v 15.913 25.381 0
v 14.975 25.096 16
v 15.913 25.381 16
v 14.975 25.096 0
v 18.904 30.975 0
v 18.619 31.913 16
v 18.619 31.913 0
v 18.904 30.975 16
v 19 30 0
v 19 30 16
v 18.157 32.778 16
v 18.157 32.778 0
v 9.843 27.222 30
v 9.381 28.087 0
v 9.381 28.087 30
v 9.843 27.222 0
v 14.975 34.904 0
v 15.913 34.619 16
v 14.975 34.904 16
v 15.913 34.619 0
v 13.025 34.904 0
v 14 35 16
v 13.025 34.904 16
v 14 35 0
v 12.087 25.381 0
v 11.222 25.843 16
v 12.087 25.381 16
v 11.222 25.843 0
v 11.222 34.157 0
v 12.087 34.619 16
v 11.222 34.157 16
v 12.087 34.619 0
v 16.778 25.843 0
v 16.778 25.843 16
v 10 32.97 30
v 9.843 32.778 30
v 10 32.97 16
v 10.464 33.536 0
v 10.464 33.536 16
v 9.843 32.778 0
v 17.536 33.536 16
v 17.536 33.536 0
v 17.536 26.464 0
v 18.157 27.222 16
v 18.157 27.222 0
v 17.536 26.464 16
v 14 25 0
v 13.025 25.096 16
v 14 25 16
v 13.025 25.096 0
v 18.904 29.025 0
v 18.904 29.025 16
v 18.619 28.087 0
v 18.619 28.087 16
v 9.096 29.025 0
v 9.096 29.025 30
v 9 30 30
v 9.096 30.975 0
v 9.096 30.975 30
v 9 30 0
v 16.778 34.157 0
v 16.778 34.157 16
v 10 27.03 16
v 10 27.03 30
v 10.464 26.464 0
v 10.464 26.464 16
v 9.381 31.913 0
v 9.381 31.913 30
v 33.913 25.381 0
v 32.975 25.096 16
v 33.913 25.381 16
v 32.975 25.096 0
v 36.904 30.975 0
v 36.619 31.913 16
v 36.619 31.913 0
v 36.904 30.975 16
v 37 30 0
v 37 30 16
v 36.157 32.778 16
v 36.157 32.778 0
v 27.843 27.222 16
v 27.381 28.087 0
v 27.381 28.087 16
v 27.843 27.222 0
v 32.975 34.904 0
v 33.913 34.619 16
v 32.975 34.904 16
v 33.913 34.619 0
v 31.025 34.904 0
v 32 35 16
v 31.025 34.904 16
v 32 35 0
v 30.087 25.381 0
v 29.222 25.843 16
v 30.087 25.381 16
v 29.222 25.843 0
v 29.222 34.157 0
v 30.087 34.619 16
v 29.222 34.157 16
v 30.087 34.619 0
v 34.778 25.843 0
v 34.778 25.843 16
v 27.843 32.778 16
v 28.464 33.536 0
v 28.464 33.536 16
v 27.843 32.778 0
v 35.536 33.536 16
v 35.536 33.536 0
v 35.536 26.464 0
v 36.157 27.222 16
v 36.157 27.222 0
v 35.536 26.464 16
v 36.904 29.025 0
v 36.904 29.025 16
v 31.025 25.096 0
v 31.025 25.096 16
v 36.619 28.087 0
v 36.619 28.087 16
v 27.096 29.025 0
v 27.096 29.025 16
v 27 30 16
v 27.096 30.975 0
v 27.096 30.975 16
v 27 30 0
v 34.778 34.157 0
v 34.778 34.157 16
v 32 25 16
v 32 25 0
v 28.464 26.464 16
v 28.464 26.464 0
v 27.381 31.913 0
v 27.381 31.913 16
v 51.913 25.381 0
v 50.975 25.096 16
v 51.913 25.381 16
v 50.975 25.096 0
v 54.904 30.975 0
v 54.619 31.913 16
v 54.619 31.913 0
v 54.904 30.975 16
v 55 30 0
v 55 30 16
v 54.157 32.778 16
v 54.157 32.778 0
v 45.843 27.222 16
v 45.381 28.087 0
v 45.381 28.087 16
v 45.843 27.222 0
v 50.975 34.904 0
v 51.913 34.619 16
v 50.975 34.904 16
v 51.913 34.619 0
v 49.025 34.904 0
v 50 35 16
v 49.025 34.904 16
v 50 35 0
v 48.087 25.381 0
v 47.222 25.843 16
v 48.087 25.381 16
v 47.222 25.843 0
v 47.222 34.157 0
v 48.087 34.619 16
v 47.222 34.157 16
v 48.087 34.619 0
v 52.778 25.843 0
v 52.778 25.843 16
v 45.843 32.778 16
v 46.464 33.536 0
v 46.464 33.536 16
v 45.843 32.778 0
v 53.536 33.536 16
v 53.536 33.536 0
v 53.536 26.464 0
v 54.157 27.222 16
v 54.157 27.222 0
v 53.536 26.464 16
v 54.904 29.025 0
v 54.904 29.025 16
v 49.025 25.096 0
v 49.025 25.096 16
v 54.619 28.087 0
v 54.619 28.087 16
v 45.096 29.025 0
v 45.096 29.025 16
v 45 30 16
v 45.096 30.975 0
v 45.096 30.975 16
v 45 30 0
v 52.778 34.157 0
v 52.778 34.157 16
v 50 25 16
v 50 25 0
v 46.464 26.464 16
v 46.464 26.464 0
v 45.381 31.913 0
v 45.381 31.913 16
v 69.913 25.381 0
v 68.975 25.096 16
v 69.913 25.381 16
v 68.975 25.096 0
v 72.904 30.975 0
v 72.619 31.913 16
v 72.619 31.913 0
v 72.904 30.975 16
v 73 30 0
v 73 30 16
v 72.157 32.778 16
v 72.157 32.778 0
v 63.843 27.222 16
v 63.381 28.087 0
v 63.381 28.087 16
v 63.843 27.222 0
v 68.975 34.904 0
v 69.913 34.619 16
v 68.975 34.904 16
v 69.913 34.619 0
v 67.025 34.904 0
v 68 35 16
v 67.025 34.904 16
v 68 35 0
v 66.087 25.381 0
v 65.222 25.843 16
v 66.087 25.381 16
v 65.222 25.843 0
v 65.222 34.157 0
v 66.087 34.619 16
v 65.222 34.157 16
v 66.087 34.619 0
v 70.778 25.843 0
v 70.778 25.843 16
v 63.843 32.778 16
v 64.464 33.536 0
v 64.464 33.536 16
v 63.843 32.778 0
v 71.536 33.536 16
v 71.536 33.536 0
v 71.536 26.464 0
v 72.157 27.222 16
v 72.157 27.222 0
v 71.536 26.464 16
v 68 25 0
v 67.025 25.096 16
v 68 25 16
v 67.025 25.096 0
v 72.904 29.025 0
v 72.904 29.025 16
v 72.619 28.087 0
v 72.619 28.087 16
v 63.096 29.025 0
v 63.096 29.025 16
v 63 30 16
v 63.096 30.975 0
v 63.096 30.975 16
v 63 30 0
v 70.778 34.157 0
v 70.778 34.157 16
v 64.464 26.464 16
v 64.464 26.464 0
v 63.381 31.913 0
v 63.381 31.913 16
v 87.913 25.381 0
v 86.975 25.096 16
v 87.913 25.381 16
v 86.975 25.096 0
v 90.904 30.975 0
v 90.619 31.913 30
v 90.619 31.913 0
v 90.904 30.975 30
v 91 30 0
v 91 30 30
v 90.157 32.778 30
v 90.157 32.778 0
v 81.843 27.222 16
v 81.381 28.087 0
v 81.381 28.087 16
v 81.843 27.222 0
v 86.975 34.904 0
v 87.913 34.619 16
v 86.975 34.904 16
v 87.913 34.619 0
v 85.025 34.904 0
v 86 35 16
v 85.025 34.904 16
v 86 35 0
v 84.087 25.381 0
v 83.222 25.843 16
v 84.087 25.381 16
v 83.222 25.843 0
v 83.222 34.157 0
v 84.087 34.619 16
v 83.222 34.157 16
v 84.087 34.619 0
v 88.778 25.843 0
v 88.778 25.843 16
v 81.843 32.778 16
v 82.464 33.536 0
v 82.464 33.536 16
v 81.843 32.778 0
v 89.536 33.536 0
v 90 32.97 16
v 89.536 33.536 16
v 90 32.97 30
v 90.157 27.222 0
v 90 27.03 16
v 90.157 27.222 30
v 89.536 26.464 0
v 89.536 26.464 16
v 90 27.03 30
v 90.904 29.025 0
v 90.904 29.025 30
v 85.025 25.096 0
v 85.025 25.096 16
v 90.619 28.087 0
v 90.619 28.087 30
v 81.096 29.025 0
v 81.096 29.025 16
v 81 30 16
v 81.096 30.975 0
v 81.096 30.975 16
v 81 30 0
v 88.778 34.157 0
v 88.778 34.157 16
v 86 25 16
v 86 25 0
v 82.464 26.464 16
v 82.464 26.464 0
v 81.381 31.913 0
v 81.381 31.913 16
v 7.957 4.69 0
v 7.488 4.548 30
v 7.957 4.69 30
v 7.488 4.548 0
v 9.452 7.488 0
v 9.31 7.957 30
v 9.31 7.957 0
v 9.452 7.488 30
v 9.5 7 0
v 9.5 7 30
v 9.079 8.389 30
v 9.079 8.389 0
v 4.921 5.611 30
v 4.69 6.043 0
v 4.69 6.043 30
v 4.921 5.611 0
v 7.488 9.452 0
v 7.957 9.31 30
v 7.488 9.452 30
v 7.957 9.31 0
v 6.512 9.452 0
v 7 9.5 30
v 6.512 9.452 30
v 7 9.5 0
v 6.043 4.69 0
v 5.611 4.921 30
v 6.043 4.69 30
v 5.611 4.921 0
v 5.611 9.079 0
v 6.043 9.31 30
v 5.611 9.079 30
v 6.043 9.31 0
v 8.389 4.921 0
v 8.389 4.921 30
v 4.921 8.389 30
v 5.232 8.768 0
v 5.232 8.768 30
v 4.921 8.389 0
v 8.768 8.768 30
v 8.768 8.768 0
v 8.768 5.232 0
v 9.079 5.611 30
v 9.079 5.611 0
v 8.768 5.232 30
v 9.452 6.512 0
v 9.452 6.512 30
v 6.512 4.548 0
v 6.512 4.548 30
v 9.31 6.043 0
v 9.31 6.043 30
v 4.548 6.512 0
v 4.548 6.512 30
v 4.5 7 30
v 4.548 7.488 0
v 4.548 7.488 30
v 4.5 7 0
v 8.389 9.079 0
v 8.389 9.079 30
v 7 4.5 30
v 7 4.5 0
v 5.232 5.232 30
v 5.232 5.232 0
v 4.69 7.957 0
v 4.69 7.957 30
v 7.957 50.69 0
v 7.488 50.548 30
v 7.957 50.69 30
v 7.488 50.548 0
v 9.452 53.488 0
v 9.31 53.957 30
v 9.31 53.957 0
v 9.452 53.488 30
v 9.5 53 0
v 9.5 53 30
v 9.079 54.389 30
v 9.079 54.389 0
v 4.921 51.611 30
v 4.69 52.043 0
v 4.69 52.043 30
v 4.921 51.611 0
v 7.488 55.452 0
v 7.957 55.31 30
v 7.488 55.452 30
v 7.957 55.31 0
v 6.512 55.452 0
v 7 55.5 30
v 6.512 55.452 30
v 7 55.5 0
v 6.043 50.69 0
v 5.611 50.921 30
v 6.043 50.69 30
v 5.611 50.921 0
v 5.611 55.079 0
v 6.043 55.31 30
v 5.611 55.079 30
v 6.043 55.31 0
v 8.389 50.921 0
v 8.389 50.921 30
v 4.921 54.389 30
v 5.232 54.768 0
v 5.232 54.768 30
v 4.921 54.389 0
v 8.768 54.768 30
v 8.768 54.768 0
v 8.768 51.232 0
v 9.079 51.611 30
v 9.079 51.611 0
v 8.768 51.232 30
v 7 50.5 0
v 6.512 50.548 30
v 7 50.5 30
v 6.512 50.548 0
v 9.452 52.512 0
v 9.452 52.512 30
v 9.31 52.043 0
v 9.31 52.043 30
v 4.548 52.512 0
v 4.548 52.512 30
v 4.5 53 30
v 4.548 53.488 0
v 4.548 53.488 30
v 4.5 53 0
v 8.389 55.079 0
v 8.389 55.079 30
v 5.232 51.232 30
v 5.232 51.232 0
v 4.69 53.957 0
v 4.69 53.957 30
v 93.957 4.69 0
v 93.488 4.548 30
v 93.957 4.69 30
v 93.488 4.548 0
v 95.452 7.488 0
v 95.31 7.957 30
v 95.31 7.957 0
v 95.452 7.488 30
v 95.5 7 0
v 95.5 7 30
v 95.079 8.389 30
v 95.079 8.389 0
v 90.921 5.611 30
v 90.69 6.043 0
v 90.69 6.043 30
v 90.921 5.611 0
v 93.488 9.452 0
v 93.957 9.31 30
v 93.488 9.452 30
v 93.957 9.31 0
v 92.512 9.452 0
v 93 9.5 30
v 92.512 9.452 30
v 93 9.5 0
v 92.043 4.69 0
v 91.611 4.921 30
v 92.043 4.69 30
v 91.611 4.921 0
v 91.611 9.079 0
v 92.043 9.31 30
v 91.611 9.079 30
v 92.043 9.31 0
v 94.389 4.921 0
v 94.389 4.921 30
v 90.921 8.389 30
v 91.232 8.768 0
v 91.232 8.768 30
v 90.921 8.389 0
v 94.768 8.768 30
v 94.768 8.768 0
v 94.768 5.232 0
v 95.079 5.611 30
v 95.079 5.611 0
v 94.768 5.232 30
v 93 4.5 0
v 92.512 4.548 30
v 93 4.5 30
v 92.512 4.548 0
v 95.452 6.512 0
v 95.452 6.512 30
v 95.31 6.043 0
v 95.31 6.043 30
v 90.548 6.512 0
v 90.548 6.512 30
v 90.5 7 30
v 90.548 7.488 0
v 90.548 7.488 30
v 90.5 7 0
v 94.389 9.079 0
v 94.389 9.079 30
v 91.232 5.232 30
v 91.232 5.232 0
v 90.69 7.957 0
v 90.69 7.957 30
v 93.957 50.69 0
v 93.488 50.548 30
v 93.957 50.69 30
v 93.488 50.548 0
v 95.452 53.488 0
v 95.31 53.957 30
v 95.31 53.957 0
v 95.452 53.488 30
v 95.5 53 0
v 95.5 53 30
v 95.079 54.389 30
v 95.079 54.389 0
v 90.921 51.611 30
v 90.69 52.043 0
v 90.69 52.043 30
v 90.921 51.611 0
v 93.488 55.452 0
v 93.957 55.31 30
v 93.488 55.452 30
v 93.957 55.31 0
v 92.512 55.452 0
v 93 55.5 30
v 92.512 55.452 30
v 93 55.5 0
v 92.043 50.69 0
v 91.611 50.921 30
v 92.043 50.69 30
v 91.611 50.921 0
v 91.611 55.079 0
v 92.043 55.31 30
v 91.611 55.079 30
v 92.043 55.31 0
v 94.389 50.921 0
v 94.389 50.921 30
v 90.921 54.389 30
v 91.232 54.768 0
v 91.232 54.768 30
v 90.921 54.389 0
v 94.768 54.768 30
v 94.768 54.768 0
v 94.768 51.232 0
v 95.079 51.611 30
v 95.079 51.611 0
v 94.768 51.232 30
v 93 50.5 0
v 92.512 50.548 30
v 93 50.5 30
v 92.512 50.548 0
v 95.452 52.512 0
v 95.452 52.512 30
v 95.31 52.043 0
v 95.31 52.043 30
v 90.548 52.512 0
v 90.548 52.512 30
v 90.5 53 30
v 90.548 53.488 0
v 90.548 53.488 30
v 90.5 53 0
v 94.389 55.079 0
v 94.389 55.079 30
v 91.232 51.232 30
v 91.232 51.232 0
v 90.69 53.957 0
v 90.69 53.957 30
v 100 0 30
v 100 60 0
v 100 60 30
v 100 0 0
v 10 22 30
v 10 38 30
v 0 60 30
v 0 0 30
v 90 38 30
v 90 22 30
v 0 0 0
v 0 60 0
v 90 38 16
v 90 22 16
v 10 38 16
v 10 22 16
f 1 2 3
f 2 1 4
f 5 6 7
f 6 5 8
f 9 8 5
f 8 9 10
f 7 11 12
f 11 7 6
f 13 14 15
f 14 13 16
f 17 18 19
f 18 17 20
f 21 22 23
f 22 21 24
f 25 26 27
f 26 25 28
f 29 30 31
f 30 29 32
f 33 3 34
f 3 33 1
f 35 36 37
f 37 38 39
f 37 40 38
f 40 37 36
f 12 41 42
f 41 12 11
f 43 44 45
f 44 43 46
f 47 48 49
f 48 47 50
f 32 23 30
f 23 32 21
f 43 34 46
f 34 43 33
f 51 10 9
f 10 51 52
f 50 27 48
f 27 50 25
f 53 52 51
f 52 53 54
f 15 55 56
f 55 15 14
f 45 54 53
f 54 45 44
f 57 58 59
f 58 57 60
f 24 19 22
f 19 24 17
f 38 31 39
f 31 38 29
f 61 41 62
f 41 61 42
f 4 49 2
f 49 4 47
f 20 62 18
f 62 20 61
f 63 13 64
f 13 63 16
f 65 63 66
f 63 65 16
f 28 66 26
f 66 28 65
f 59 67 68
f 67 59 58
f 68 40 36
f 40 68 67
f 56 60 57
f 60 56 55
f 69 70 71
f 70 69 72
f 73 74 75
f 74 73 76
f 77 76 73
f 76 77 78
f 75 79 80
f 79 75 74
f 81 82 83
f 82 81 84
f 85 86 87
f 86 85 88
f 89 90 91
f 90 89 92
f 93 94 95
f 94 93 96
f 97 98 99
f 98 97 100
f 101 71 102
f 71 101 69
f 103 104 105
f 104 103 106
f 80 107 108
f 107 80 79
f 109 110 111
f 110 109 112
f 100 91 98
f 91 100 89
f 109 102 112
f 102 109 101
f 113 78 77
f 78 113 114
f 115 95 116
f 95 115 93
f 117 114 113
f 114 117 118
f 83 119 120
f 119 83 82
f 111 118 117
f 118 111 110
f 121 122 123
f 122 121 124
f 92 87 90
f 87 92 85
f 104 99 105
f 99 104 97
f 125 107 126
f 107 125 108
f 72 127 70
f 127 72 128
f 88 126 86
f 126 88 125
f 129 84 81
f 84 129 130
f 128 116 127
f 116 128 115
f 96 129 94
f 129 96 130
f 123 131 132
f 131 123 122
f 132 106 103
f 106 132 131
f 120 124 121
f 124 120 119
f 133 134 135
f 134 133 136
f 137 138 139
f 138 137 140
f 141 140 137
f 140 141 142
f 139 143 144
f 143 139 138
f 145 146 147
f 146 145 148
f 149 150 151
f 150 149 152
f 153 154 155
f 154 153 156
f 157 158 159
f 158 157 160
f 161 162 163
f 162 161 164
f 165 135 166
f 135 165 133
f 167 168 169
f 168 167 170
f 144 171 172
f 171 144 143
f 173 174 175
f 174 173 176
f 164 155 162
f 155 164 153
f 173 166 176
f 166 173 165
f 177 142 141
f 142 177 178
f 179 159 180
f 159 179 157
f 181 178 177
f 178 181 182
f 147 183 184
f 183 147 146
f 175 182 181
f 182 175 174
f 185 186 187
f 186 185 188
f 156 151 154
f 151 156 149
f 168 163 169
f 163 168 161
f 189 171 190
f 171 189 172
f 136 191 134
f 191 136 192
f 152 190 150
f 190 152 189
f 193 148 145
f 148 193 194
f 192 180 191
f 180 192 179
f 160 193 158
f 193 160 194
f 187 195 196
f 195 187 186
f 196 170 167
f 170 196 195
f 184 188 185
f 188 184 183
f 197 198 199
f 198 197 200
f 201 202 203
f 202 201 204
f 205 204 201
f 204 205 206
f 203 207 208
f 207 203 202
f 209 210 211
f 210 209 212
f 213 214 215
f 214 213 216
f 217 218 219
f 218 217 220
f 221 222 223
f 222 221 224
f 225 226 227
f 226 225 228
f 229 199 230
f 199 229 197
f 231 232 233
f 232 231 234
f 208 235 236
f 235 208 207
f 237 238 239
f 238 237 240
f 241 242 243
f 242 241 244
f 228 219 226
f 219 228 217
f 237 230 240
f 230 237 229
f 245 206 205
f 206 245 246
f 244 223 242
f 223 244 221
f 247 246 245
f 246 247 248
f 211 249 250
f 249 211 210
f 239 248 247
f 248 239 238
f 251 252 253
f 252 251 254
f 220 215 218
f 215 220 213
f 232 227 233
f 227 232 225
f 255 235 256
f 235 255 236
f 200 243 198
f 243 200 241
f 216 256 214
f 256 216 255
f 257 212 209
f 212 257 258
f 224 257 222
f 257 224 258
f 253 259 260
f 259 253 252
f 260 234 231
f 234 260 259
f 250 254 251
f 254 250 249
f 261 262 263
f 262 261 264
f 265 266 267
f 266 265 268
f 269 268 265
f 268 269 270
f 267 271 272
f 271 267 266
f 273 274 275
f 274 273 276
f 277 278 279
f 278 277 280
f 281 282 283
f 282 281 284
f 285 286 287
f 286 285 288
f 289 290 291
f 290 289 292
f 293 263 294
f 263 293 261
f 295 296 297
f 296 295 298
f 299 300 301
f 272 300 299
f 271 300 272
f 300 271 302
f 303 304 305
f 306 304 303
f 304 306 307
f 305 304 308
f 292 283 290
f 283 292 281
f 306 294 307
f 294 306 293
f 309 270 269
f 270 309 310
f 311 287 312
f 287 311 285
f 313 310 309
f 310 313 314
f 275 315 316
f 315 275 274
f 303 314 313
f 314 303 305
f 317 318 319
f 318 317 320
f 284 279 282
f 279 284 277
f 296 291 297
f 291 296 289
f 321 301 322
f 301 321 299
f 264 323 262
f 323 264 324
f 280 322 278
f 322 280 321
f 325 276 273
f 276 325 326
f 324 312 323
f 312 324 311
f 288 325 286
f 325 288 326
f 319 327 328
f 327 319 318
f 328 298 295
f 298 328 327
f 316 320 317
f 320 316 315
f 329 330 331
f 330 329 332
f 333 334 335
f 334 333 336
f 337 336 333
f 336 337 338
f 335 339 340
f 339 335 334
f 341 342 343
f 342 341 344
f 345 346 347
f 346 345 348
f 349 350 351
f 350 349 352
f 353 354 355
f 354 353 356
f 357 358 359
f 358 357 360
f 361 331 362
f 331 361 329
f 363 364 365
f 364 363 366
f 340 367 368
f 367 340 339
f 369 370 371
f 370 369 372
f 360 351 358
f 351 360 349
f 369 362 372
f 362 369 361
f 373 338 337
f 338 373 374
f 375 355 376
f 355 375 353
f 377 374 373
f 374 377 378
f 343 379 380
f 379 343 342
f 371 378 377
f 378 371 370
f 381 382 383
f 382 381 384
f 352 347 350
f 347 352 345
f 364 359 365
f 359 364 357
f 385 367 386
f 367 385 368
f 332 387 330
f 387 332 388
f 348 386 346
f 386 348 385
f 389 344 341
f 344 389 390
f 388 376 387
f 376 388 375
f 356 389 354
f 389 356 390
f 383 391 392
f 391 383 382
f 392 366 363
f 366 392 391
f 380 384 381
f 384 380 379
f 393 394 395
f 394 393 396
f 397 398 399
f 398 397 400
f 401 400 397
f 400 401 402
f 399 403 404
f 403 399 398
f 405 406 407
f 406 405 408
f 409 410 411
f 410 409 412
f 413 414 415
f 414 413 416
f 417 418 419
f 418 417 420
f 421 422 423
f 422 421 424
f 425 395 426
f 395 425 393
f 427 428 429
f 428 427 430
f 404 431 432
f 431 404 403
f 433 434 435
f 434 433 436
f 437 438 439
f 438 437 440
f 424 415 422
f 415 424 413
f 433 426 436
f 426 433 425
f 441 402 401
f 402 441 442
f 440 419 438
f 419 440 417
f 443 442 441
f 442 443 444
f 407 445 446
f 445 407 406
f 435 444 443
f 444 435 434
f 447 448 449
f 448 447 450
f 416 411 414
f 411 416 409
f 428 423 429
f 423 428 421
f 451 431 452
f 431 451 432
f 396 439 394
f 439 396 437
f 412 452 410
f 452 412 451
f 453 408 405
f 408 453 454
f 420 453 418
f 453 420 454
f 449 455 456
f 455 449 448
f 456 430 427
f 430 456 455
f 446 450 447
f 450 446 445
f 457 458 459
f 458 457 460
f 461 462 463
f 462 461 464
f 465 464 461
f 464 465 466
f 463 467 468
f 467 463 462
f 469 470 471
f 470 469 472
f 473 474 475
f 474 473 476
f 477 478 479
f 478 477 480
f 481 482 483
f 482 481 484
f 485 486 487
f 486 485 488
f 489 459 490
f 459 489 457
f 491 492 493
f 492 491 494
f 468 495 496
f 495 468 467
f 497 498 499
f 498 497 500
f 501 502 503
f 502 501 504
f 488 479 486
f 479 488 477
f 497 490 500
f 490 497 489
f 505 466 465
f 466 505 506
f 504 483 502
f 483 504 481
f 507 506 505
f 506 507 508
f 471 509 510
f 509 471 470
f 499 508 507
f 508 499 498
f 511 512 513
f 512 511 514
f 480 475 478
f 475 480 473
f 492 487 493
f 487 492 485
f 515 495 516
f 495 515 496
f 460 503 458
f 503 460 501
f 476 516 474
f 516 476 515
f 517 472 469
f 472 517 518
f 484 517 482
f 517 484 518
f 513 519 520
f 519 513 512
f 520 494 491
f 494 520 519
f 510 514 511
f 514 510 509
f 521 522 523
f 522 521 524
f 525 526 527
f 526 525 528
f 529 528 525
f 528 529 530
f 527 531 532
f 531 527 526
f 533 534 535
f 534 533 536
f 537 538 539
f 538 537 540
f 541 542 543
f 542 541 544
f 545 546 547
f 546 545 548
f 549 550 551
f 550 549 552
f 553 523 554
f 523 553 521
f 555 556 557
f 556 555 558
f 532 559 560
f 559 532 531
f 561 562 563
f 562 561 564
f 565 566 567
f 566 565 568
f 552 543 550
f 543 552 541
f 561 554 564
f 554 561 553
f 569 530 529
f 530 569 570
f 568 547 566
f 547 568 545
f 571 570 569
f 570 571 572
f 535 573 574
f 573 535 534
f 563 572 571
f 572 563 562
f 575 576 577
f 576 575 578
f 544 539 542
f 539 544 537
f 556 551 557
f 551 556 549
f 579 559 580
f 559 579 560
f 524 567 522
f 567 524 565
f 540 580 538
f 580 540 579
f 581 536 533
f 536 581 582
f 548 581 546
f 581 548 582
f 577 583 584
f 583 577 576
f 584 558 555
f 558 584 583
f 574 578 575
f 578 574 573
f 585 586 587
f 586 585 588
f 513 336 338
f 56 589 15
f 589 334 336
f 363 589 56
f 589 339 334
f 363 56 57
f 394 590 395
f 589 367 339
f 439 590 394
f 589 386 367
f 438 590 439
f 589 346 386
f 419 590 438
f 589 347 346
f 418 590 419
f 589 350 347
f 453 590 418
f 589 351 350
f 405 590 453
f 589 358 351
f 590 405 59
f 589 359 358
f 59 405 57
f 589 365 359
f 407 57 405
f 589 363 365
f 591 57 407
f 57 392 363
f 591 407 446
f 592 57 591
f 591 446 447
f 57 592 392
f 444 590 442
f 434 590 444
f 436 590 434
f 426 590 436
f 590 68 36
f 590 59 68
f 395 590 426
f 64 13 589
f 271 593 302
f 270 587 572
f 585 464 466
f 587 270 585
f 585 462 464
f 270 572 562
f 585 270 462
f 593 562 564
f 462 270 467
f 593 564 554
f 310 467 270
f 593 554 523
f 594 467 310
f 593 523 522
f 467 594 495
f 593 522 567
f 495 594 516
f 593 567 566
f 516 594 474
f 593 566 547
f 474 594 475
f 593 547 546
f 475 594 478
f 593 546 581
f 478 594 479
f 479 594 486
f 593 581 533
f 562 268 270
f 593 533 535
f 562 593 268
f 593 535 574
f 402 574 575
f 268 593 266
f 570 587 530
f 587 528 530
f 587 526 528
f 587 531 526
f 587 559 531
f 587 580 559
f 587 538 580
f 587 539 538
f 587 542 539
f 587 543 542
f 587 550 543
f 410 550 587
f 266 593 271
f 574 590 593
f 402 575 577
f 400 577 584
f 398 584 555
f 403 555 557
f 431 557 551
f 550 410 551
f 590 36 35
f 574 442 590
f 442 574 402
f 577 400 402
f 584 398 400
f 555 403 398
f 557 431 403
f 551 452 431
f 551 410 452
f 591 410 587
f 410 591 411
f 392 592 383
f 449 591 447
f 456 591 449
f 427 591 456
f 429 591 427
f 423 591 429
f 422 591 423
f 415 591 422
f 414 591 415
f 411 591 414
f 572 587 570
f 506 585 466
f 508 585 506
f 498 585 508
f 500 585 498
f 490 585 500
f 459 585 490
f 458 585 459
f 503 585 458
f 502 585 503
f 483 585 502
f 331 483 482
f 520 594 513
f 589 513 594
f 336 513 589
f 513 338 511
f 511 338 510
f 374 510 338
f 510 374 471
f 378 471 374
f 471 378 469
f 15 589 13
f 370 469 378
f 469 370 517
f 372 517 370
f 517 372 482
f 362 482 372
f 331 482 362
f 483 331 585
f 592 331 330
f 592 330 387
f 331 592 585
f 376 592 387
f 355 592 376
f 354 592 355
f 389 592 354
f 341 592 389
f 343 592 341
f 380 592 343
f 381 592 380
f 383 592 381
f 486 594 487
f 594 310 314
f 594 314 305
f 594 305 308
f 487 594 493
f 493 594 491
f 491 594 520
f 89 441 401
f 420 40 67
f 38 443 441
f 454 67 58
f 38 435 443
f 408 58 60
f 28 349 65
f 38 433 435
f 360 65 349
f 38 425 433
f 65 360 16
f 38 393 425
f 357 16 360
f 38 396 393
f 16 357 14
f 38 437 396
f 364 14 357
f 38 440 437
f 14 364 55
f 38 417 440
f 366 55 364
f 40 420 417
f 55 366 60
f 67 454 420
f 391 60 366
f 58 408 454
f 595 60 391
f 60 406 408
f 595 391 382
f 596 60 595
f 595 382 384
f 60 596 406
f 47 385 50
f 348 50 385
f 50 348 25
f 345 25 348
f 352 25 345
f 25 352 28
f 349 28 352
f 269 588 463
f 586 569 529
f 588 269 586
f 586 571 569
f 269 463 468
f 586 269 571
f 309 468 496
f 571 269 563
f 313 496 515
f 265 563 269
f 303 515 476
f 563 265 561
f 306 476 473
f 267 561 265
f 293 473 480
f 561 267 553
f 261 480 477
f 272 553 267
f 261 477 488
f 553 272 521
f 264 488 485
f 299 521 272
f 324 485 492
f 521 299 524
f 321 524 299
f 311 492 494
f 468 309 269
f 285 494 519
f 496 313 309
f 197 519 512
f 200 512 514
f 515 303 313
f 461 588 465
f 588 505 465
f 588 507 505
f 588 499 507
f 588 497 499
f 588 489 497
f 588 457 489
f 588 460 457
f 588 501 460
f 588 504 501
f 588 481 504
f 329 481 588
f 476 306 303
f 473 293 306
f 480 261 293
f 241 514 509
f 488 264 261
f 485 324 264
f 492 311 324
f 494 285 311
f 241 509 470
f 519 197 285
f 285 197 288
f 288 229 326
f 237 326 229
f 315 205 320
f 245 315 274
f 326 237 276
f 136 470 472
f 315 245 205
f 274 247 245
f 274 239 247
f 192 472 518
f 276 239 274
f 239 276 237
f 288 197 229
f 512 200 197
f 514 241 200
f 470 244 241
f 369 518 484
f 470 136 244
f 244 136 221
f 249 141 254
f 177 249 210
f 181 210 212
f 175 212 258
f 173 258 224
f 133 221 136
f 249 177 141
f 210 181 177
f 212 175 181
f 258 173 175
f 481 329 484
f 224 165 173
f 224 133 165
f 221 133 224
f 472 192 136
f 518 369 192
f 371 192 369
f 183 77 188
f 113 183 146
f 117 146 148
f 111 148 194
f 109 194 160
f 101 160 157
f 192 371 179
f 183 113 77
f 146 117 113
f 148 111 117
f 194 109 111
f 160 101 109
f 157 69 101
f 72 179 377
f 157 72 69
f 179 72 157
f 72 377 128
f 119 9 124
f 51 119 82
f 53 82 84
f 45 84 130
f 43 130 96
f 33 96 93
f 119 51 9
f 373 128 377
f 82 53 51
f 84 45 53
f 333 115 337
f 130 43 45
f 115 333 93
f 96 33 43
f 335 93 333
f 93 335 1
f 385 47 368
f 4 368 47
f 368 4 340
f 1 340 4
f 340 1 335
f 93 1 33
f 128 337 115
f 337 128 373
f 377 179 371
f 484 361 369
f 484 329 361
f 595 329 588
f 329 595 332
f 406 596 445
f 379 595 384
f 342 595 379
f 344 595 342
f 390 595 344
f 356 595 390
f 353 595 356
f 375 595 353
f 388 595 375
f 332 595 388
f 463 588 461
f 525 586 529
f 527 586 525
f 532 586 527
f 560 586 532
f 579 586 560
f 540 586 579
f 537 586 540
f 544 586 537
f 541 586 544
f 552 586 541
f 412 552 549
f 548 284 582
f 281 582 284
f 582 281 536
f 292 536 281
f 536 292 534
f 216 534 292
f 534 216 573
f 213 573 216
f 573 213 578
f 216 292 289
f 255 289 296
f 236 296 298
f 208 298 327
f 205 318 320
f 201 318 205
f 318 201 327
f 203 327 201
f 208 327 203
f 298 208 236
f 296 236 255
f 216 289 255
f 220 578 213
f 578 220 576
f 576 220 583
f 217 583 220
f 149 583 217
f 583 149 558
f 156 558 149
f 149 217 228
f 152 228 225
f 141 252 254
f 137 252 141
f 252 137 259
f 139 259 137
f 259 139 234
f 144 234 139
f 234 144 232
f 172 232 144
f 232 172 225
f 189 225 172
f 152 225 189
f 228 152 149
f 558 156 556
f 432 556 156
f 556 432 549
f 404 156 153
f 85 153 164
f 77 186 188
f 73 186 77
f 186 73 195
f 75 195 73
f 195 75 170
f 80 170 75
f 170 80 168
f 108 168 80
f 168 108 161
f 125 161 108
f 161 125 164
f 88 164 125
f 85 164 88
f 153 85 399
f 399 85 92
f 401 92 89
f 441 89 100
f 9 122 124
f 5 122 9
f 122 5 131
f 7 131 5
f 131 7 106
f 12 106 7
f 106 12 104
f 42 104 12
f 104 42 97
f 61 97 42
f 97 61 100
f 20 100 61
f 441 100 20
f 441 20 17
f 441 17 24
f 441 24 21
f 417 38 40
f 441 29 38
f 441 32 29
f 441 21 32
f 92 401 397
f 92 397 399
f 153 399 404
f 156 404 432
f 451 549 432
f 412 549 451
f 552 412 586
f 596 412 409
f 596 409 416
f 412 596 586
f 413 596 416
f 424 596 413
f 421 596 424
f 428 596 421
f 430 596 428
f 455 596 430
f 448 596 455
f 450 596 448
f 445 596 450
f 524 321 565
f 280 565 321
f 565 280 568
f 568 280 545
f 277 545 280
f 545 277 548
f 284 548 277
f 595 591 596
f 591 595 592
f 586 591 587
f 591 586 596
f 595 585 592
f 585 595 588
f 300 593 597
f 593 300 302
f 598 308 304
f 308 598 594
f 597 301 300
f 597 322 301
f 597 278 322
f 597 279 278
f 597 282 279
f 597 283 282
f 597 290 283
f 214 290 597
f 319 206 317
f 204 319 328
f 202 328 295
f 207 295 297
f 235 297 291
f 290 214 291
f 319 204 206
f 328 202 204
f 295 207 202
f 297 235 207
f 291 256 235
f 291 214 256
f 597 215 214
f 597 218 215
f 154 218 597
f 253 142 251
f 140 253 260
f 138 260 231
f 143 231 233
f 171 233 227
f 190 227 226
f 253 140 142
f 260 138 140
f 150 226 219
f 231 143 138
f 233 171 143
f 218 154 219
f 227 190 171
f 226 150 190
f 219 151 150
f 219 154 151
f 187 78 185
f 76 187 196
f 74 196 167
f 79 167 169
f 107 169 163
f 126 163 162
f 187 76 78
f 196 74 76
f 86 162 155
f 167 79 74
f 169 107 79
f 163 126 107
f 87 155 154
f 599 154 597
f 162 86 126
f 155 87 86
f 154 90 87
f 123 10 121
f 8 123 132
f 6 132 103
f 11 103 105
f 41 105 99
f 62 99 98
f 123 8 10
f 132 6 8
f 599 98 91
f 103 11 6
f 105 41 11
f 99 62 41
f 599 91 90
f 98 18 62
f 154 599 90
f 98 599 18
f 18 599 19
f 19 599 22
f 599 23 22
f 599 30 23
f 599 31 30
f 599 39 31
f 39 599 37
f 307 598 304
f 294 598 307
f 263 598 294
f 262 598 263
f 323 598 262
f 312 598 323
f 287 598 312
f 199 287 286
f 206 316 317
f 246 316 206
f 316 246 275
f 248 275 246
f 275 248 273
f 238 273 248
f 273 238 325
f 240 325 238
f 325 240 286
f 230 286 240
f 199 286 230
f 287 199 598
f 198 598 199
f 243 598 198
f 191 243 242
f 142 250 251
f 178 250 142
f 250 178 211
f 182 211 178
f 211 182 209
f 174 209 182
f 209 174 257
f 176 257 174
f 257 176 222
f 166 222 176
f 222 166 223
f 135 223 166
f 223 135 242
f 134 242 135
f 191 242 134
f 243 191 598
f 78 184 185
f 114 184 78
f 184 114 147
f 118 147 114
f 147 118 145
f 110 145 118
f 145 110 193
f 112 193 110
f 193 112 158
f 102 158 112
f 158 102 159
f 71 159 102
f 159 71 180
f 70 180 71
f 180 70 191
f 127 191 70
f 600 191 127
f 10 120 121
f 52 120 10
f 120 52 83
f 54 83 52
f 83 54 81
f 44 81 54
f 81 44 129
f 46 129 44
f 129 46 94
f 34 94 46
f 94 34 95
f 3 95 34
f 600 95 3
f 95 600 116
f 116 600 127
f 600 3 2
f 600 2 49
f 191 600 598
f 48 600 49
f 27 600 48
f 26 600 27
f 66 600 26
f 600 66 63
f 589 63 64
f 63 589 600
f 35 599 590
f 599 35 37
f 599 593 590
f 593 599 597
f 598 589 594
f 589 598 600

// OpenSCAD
$fn = 32;

// ----------------------------------------------------------------------
// Manifold block: gallery_top manifold
// ----------------------------------------------------------------------

// --- parameters (mm) ---
block_l = 100;            // block length, X
block_w = 60;             // block width, Y
block_h = 30;             // block height, Z
port_d = 10;              // port bore diameter
port_pitch = 18;          // port pitch along X
gallery_d = 16;           // top gallery width, Y
gallery_depth = 14;       // gallery pocket depth
wall_p = 10;              // gallery end wall thickness, X
mnt_d = 5;                // mounting hole diameter
mnt_in = 7;               // mounting hole inset from the edges

n_ports = 5;  // ports in the row
port_x0 = (block_l - (n_ports - 1) * port_pitch) / 2;  // first port X

difference() {
  cube([block_l, block_w, block_h]);
  for (i = [0 : n_ports - 1])
    translate([port_x0 + i * port_pitch, block_w / 2, -1])
      cylinder(h = block_h + 2, d = port_d);
  translate([wall_p, block_w / 2 - gallery_d / 2, block_h - gallery_depth])
    cube([block_l - 2 * wall_p, gallery_d, gallery_depth + 1]);
  for (cx = [mnt_in, block_l - mnt_in])
    for (cy = [mnt_in, block_w - mnt_in])
      translate([cx, cy, -1]) cylinder(h = block_h + 2, d = mnt_d);
}
